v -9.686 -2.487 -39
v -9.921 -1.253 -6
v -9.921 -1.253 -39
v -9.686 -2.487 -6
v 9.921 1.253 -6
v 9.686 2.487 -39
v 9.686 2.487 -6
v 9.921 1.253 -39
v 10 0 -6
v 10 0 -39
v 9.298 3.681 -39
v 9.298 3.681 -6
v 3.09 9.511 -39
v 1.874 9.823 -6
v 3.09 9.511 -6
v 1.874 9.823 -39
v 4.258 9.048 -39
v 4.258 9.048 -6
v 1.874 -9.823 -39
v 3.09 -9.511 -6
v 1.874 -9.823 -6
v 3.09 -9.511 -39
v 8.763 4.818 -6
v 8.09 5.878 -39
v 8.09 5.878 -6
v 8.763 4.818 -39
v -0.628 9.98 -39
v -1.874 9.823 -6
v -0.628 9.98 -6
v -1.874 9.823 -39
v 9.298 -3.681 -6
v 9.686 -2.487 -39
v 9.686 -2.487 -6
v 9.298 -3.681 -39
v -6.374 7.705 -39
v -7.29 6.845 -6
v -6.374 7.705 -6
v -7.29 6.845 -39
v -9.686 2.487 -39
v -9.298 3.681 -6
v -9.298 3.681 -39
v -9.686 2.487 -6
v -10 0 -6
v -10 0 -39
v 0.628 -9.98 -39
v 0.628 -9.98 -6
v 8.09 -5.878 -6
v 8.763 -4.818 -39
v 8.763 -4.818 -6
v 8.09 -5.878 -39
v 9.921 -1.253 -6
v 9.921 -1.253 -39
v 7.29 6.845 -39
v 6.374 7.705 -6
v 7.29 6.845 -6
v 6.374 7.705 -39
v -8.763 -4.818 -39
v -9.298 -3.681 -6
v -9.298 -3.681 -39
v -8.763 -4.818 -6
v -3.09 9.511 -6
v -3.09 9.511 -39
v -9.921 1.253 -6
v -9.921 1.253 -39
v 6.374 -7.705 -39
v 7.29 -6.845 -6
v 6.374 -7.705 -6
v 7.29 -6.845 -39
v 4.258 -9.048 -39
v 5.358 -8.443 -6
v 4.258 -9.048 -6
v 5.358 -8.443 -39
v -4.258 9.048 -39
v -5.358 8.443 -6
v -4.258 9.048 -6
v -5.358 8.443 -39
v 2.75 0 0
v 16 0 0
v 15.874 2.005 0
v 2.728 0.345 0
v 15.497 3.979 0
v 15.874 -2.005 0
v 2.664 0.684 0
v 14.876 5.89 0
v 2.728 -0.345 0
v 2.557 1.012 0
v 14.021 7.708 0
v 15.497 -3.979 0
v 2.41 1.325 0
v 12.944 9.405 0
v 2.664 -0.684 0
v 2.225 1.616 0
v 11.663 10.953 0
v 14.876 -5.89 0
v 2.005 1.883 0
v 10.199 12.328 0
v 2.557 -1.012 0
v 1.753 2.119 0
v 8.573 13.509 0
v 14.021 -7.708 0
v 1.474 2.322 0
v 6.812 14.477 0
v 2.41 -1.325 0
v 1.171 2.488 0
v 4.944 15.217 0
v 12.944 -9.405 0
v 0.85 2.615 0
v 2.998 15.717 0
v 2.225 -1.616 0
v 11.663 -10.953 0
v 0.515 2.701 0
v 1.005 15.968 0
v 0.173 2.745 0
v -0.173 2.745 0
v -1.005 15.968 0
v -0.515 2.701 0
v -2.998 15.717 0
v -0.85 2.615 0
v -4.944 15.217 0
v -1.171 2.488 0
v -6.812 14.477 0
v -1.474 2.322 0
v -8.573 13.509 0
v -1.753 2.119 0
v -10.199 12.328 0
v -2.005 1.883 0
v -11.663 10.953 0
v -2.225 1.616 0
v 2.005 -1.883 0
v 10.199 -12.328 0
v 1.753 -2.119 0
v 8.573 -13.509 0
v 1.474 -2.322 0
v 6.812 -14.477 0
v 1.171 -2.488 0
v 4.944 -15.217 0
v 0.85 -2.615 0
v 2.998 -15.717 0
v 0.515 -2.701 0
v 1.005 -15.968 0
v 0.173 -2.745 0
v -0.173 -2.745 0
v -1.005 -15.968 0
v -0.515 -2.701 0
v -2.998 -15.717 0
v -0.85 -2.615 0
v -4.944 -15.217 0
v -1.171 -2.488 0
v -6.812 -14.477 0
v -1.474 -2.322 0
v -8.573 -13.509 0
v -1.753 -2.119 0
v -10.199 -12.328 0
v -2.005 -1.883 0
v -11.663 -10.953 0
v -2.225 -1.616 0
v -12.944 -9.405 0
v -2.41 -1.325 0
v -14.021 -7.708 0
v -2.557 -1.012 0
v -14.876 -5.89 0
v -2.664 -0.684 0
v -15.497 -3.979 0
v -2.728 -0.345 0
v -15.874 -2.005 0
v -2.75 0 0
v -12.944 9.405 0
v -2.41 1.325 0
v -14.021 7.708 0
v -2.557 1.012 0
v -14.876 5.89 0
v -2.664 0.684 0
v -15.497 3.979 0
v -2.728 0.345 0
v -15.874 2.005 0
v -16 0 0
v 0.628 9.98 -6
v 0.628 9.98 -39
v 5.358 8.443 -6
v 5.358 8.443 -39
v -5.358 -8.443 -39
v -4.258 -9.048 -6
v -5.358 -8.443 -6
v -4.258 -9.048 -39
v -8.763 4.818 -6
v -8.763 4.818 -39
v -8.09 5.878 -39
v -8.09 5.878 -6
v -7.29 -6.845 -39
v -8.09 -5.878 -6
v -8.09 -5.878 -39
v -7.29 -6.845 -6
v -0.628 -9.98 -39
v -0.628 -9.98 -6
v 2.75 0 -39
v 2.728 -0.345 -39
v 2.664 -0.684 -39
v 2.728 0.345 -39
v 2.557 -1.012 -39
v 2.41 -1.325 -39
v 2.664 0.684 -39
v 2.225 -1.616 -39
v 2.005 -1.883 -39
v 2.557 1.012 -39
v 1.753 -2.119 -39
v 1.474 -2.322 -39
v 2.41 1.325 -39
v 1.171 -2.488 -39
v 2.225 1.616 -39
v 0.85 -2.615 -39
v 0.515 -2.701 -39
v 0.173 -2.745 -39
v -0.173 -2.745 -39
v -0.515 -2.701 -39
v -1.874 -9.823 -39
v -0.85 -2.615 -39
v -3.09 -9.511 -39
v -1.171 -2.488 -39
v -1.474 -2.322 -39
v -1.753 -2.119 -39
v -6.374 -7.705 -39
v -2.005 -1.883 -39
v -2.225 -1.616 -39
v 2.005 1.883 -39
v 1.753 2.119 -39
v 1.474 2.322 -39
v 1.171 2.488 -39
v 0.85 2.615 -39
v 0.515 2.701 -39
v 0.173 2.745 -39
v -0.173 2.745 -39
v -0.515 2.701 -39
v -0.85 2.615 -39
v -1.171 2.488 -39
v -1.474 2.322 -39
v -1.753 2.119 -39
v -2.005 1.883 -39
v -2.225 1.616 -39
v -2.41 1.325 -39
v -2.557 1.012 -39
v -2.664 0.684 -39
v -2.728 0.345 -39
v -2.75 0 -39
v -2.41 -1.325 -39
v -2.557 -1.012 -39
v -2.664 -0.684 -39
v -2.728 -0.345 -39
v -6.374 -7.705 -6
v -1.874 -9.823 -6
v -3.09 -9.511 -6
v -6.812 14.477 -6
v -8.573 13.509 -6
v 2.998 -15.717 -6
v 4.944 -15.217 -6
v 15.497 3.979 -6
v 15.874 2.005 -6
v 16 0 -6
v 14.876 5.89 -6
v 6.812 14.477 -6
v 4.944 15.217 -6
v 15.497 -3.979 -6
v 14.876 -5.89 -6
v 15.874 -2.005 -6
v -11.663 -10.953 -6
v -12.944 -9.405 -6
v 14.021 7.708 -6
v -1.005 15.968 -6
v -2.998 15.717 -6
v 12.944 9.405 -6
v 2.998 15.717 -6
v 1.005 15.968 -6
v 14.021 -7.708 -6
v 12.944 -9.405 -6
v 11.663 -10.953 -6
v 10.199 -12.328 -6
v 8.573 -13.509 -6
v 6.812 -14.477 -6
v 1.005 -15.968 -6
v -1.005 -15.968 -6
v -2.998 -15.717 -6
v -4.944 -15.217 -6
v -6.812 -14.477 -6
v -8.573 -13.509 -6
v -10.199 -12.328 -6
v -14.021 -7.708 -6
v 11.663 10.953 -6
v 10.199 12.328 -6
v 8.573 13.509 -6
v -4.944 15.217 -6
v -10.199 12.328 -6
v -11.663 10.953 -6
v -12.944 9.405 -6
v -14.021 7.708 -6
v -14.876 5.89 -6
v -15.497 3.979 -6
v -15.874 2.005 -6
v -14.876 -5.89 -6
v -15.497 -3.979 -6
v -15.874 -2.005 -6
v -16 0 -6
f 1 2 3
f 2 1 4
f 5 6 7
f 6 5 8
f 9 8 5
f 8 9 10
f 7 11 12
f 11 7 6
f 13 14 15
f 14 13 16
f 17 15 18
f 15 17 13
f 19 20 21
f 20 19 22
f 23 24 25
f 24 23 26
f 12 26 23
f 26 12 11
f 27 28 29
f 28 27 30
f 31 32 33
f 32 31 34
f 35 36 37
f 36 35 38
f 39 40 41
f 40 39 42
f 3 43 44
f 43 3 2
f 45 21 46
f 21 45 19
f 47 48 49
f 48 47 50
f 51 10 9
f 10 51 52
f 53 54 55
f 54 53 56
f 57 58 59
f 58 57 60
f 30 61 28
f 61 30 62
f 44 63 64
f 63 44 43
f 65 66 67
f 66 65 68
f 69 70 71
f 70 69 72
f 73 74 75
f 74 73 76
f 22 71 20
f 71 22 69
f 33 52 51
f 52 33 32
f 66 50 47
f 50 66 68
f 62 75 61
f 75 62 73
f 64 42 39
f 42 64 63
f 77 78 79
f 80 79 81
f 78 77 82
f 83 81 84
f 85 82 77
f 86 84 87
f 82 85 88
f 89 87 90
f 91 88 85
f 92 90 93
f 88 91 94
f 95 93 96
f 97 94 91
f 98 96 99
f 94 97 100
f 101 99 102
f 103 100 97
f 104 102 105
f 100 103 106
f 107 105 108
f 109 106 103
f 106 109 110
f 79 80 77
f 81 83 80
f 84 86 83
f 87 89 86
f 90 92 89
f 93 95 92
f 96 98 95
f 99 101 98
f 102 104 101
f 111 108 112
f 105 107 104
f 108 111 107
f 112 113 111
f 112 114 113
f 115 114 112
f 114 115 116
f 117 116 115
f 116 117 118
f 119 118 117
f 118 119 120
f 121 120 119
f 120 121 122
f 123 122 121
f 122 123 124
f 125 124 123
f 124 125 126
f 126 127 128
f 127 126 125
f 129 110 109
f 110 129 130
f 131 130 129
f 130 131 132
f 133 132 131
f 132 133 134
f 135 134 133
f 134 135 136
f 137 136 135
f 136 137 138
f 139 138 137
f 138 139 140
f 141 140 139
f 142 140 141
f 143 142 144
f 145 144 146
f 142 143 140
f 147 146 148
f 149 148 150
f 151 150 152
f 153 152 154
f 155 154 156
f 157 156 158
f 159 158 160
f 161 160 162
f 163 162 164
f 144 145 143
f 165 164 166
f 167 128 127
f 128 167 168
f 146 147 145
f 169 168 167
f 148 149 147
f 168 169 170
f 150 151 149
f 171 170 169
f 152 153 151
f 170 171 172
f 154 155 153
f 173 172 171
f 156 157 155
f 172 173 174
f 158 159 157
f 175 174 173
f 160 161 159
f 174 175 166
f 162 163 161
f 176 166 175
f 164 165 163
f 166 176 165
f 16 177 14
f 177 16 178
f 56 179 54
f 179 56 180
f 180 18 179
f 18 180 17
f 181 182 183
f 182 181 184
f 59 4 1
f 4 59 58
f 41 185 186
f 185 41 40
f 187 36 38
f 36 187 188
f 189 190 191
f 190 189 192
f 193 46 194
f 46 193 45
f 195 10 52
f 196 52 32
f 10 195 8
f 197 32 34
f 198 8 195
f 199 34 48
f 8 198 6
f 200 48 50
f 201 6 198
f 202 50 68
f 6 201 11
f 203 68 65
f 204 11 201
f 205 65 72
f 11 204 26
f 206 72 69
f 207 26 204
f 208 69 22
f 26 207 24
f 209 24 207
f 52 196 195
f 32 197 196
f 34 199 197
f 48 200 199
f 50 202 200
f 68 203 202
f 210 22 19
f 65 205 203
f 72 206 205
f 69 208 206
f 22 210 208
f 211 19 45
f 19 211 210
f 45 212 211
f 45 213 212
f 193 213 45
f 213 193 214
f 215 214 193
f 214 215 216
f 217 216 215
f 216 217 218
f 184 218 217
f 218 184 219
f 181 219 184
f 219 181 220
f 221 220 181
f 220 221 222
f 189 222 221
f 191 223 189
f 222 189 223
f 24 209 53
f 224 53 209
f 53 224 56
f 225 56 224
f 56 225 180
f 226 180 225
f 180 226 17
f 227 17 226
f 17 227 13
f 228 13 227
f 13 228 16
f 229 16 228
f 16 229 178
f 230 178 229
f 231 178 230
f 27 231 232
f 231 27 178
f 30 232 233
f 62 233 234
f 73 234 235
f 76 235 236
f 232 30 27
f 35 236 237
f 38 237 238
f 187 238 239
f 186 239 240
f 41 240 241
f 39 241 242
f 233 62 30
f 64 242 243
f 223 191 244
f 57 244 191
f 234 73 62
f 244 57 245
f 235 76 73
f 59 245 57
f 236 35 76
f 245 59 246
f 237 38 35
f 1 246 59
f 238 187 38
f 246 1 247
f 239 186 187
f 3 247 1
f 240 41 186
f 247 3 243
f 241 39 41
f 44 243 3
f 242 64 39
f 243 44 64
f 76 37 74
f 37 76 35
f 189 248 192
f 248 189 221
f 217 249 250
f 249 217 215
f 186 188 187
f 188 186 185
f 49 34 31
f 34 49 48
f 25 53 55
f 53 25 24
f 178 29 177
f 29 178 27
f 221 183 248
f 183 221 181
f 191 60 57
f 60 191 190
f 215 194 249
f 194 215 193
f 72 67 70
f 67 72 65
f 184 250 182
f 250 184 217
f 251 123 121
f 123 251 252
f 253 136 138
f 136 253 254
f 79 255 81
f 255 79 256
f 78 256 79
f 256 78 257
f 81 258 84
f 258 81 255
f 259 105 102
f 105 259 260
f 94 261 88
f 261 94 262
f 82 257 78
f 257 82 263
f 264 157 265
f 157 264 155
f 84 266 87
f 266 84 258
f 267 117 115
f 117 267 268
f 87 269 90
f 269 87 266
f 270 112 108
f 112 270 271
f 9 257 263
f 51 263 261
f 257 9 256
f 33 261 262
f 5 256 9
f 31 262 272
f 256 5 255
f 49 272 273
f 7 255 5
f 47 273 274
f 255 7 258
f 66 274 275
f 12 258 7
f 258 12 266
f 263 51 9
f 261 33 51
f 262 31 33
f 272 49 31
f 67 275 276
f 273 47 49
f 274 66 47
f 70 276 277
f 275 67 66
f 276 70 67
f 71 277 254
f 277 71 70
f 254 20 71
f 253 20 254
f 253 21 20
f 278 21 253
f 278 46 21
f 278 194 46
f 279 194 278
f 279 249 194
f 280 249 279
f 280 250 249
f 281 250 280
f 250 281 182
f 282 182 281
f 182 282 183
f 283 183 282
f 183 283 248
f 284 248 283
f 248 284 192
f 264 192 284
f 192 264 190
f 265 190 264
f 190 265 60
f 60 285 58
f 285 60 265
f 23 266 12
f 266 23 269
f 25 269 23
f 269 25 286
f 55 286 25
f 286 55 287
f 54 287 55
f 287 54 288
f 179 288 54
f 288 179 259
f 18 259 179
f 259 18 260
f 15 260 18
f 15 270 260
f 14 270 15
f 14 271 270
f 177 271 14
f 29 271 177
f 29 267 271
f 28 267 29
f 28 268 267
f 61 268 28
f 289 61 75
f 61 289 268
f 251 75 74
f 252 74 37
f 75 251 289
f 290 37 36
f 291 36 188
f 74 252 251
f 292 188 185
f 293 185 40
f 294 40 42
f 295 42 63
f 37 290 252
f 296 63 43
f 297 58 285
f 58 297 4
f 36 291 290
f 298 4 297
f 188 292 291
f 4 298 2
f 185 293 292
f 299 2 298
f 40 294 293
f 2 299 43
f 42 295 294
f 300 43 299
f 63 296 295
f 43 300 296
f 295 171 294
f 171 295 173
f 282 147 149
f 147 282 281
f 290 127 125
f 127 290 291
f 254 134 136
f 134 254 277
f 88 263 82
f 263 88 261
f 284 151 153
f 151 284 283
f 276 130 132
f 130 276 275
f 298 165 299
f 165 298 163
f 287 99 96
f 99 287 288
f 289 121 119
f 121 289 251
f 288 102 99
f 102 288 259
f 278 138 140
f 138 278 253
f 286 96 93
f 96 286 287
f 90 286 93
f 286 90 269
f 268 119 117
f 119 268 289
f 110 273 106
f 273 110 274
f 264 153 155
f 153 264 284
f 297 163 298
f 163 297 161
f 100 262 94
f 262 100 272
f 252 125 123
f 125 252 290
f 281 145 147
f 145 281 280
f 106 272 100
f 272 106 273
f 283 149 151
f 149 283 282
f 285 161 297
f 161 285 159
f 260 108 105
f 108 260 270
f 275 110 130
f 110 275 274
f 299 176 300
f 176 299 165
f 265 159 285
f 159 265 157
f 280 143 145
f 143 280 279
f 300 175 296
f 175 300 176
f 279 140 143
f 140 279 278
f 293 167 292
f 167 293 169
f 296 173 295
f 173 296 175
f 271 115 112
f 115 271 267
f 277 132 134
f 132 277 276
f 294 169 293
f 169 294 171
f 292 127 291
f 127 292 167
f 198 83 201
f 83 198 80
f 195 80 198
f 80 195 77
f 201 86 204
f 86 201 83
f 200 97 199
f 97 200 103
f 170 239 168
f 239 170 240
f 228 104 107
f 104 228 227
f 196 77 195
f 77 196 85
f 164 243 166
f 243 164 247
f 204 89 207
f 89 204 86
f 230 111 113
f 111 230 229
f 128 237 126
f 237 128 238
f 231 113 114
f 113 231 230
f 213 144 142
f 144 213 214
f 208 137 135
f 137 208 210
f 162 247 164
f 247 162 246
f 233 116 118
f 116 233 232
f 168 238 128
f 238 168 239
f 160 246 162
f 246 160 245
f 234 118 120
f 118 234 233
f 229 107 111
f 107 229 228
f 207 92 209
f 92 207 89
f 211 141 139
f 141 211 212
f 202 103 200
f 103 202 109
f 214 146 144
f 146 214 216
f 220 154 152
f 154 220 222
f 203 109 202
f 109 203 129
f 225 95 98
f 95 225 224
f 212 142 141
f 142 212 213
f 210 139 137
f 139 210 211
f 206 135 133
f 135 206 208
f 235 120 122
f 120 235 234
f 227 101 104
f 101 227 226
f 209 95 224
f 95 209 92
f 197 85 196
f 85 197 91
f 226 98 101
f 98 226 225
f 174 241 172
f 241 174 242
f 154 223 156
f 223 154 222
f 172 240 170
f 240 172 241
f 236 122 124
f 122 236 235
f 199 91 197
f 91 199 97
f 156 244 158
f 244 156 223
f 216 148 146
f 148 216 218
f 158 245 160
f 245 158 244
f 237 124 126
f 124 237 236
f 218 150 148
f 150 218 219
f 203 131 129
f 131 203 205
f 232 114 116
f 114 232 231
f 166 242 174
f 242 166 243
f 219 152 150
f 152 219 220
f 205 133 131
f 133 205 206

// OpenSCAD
$fn = 50;


difference() {
	union() {
		translate(v = [0, 0, -39.0000000000]) {
			cylinder(h = 39, r = 10.0000000000);
		}
		translate(v = [0, 0, -6.0000000000]) {
			cylinder(h = 6, r = 16.0000000000);
		}
	}
	union() {
		#translate(v = [0, 0, -39]) {
			cylinder(h = 39, r = 2.7500000000);
		}
	}
}
